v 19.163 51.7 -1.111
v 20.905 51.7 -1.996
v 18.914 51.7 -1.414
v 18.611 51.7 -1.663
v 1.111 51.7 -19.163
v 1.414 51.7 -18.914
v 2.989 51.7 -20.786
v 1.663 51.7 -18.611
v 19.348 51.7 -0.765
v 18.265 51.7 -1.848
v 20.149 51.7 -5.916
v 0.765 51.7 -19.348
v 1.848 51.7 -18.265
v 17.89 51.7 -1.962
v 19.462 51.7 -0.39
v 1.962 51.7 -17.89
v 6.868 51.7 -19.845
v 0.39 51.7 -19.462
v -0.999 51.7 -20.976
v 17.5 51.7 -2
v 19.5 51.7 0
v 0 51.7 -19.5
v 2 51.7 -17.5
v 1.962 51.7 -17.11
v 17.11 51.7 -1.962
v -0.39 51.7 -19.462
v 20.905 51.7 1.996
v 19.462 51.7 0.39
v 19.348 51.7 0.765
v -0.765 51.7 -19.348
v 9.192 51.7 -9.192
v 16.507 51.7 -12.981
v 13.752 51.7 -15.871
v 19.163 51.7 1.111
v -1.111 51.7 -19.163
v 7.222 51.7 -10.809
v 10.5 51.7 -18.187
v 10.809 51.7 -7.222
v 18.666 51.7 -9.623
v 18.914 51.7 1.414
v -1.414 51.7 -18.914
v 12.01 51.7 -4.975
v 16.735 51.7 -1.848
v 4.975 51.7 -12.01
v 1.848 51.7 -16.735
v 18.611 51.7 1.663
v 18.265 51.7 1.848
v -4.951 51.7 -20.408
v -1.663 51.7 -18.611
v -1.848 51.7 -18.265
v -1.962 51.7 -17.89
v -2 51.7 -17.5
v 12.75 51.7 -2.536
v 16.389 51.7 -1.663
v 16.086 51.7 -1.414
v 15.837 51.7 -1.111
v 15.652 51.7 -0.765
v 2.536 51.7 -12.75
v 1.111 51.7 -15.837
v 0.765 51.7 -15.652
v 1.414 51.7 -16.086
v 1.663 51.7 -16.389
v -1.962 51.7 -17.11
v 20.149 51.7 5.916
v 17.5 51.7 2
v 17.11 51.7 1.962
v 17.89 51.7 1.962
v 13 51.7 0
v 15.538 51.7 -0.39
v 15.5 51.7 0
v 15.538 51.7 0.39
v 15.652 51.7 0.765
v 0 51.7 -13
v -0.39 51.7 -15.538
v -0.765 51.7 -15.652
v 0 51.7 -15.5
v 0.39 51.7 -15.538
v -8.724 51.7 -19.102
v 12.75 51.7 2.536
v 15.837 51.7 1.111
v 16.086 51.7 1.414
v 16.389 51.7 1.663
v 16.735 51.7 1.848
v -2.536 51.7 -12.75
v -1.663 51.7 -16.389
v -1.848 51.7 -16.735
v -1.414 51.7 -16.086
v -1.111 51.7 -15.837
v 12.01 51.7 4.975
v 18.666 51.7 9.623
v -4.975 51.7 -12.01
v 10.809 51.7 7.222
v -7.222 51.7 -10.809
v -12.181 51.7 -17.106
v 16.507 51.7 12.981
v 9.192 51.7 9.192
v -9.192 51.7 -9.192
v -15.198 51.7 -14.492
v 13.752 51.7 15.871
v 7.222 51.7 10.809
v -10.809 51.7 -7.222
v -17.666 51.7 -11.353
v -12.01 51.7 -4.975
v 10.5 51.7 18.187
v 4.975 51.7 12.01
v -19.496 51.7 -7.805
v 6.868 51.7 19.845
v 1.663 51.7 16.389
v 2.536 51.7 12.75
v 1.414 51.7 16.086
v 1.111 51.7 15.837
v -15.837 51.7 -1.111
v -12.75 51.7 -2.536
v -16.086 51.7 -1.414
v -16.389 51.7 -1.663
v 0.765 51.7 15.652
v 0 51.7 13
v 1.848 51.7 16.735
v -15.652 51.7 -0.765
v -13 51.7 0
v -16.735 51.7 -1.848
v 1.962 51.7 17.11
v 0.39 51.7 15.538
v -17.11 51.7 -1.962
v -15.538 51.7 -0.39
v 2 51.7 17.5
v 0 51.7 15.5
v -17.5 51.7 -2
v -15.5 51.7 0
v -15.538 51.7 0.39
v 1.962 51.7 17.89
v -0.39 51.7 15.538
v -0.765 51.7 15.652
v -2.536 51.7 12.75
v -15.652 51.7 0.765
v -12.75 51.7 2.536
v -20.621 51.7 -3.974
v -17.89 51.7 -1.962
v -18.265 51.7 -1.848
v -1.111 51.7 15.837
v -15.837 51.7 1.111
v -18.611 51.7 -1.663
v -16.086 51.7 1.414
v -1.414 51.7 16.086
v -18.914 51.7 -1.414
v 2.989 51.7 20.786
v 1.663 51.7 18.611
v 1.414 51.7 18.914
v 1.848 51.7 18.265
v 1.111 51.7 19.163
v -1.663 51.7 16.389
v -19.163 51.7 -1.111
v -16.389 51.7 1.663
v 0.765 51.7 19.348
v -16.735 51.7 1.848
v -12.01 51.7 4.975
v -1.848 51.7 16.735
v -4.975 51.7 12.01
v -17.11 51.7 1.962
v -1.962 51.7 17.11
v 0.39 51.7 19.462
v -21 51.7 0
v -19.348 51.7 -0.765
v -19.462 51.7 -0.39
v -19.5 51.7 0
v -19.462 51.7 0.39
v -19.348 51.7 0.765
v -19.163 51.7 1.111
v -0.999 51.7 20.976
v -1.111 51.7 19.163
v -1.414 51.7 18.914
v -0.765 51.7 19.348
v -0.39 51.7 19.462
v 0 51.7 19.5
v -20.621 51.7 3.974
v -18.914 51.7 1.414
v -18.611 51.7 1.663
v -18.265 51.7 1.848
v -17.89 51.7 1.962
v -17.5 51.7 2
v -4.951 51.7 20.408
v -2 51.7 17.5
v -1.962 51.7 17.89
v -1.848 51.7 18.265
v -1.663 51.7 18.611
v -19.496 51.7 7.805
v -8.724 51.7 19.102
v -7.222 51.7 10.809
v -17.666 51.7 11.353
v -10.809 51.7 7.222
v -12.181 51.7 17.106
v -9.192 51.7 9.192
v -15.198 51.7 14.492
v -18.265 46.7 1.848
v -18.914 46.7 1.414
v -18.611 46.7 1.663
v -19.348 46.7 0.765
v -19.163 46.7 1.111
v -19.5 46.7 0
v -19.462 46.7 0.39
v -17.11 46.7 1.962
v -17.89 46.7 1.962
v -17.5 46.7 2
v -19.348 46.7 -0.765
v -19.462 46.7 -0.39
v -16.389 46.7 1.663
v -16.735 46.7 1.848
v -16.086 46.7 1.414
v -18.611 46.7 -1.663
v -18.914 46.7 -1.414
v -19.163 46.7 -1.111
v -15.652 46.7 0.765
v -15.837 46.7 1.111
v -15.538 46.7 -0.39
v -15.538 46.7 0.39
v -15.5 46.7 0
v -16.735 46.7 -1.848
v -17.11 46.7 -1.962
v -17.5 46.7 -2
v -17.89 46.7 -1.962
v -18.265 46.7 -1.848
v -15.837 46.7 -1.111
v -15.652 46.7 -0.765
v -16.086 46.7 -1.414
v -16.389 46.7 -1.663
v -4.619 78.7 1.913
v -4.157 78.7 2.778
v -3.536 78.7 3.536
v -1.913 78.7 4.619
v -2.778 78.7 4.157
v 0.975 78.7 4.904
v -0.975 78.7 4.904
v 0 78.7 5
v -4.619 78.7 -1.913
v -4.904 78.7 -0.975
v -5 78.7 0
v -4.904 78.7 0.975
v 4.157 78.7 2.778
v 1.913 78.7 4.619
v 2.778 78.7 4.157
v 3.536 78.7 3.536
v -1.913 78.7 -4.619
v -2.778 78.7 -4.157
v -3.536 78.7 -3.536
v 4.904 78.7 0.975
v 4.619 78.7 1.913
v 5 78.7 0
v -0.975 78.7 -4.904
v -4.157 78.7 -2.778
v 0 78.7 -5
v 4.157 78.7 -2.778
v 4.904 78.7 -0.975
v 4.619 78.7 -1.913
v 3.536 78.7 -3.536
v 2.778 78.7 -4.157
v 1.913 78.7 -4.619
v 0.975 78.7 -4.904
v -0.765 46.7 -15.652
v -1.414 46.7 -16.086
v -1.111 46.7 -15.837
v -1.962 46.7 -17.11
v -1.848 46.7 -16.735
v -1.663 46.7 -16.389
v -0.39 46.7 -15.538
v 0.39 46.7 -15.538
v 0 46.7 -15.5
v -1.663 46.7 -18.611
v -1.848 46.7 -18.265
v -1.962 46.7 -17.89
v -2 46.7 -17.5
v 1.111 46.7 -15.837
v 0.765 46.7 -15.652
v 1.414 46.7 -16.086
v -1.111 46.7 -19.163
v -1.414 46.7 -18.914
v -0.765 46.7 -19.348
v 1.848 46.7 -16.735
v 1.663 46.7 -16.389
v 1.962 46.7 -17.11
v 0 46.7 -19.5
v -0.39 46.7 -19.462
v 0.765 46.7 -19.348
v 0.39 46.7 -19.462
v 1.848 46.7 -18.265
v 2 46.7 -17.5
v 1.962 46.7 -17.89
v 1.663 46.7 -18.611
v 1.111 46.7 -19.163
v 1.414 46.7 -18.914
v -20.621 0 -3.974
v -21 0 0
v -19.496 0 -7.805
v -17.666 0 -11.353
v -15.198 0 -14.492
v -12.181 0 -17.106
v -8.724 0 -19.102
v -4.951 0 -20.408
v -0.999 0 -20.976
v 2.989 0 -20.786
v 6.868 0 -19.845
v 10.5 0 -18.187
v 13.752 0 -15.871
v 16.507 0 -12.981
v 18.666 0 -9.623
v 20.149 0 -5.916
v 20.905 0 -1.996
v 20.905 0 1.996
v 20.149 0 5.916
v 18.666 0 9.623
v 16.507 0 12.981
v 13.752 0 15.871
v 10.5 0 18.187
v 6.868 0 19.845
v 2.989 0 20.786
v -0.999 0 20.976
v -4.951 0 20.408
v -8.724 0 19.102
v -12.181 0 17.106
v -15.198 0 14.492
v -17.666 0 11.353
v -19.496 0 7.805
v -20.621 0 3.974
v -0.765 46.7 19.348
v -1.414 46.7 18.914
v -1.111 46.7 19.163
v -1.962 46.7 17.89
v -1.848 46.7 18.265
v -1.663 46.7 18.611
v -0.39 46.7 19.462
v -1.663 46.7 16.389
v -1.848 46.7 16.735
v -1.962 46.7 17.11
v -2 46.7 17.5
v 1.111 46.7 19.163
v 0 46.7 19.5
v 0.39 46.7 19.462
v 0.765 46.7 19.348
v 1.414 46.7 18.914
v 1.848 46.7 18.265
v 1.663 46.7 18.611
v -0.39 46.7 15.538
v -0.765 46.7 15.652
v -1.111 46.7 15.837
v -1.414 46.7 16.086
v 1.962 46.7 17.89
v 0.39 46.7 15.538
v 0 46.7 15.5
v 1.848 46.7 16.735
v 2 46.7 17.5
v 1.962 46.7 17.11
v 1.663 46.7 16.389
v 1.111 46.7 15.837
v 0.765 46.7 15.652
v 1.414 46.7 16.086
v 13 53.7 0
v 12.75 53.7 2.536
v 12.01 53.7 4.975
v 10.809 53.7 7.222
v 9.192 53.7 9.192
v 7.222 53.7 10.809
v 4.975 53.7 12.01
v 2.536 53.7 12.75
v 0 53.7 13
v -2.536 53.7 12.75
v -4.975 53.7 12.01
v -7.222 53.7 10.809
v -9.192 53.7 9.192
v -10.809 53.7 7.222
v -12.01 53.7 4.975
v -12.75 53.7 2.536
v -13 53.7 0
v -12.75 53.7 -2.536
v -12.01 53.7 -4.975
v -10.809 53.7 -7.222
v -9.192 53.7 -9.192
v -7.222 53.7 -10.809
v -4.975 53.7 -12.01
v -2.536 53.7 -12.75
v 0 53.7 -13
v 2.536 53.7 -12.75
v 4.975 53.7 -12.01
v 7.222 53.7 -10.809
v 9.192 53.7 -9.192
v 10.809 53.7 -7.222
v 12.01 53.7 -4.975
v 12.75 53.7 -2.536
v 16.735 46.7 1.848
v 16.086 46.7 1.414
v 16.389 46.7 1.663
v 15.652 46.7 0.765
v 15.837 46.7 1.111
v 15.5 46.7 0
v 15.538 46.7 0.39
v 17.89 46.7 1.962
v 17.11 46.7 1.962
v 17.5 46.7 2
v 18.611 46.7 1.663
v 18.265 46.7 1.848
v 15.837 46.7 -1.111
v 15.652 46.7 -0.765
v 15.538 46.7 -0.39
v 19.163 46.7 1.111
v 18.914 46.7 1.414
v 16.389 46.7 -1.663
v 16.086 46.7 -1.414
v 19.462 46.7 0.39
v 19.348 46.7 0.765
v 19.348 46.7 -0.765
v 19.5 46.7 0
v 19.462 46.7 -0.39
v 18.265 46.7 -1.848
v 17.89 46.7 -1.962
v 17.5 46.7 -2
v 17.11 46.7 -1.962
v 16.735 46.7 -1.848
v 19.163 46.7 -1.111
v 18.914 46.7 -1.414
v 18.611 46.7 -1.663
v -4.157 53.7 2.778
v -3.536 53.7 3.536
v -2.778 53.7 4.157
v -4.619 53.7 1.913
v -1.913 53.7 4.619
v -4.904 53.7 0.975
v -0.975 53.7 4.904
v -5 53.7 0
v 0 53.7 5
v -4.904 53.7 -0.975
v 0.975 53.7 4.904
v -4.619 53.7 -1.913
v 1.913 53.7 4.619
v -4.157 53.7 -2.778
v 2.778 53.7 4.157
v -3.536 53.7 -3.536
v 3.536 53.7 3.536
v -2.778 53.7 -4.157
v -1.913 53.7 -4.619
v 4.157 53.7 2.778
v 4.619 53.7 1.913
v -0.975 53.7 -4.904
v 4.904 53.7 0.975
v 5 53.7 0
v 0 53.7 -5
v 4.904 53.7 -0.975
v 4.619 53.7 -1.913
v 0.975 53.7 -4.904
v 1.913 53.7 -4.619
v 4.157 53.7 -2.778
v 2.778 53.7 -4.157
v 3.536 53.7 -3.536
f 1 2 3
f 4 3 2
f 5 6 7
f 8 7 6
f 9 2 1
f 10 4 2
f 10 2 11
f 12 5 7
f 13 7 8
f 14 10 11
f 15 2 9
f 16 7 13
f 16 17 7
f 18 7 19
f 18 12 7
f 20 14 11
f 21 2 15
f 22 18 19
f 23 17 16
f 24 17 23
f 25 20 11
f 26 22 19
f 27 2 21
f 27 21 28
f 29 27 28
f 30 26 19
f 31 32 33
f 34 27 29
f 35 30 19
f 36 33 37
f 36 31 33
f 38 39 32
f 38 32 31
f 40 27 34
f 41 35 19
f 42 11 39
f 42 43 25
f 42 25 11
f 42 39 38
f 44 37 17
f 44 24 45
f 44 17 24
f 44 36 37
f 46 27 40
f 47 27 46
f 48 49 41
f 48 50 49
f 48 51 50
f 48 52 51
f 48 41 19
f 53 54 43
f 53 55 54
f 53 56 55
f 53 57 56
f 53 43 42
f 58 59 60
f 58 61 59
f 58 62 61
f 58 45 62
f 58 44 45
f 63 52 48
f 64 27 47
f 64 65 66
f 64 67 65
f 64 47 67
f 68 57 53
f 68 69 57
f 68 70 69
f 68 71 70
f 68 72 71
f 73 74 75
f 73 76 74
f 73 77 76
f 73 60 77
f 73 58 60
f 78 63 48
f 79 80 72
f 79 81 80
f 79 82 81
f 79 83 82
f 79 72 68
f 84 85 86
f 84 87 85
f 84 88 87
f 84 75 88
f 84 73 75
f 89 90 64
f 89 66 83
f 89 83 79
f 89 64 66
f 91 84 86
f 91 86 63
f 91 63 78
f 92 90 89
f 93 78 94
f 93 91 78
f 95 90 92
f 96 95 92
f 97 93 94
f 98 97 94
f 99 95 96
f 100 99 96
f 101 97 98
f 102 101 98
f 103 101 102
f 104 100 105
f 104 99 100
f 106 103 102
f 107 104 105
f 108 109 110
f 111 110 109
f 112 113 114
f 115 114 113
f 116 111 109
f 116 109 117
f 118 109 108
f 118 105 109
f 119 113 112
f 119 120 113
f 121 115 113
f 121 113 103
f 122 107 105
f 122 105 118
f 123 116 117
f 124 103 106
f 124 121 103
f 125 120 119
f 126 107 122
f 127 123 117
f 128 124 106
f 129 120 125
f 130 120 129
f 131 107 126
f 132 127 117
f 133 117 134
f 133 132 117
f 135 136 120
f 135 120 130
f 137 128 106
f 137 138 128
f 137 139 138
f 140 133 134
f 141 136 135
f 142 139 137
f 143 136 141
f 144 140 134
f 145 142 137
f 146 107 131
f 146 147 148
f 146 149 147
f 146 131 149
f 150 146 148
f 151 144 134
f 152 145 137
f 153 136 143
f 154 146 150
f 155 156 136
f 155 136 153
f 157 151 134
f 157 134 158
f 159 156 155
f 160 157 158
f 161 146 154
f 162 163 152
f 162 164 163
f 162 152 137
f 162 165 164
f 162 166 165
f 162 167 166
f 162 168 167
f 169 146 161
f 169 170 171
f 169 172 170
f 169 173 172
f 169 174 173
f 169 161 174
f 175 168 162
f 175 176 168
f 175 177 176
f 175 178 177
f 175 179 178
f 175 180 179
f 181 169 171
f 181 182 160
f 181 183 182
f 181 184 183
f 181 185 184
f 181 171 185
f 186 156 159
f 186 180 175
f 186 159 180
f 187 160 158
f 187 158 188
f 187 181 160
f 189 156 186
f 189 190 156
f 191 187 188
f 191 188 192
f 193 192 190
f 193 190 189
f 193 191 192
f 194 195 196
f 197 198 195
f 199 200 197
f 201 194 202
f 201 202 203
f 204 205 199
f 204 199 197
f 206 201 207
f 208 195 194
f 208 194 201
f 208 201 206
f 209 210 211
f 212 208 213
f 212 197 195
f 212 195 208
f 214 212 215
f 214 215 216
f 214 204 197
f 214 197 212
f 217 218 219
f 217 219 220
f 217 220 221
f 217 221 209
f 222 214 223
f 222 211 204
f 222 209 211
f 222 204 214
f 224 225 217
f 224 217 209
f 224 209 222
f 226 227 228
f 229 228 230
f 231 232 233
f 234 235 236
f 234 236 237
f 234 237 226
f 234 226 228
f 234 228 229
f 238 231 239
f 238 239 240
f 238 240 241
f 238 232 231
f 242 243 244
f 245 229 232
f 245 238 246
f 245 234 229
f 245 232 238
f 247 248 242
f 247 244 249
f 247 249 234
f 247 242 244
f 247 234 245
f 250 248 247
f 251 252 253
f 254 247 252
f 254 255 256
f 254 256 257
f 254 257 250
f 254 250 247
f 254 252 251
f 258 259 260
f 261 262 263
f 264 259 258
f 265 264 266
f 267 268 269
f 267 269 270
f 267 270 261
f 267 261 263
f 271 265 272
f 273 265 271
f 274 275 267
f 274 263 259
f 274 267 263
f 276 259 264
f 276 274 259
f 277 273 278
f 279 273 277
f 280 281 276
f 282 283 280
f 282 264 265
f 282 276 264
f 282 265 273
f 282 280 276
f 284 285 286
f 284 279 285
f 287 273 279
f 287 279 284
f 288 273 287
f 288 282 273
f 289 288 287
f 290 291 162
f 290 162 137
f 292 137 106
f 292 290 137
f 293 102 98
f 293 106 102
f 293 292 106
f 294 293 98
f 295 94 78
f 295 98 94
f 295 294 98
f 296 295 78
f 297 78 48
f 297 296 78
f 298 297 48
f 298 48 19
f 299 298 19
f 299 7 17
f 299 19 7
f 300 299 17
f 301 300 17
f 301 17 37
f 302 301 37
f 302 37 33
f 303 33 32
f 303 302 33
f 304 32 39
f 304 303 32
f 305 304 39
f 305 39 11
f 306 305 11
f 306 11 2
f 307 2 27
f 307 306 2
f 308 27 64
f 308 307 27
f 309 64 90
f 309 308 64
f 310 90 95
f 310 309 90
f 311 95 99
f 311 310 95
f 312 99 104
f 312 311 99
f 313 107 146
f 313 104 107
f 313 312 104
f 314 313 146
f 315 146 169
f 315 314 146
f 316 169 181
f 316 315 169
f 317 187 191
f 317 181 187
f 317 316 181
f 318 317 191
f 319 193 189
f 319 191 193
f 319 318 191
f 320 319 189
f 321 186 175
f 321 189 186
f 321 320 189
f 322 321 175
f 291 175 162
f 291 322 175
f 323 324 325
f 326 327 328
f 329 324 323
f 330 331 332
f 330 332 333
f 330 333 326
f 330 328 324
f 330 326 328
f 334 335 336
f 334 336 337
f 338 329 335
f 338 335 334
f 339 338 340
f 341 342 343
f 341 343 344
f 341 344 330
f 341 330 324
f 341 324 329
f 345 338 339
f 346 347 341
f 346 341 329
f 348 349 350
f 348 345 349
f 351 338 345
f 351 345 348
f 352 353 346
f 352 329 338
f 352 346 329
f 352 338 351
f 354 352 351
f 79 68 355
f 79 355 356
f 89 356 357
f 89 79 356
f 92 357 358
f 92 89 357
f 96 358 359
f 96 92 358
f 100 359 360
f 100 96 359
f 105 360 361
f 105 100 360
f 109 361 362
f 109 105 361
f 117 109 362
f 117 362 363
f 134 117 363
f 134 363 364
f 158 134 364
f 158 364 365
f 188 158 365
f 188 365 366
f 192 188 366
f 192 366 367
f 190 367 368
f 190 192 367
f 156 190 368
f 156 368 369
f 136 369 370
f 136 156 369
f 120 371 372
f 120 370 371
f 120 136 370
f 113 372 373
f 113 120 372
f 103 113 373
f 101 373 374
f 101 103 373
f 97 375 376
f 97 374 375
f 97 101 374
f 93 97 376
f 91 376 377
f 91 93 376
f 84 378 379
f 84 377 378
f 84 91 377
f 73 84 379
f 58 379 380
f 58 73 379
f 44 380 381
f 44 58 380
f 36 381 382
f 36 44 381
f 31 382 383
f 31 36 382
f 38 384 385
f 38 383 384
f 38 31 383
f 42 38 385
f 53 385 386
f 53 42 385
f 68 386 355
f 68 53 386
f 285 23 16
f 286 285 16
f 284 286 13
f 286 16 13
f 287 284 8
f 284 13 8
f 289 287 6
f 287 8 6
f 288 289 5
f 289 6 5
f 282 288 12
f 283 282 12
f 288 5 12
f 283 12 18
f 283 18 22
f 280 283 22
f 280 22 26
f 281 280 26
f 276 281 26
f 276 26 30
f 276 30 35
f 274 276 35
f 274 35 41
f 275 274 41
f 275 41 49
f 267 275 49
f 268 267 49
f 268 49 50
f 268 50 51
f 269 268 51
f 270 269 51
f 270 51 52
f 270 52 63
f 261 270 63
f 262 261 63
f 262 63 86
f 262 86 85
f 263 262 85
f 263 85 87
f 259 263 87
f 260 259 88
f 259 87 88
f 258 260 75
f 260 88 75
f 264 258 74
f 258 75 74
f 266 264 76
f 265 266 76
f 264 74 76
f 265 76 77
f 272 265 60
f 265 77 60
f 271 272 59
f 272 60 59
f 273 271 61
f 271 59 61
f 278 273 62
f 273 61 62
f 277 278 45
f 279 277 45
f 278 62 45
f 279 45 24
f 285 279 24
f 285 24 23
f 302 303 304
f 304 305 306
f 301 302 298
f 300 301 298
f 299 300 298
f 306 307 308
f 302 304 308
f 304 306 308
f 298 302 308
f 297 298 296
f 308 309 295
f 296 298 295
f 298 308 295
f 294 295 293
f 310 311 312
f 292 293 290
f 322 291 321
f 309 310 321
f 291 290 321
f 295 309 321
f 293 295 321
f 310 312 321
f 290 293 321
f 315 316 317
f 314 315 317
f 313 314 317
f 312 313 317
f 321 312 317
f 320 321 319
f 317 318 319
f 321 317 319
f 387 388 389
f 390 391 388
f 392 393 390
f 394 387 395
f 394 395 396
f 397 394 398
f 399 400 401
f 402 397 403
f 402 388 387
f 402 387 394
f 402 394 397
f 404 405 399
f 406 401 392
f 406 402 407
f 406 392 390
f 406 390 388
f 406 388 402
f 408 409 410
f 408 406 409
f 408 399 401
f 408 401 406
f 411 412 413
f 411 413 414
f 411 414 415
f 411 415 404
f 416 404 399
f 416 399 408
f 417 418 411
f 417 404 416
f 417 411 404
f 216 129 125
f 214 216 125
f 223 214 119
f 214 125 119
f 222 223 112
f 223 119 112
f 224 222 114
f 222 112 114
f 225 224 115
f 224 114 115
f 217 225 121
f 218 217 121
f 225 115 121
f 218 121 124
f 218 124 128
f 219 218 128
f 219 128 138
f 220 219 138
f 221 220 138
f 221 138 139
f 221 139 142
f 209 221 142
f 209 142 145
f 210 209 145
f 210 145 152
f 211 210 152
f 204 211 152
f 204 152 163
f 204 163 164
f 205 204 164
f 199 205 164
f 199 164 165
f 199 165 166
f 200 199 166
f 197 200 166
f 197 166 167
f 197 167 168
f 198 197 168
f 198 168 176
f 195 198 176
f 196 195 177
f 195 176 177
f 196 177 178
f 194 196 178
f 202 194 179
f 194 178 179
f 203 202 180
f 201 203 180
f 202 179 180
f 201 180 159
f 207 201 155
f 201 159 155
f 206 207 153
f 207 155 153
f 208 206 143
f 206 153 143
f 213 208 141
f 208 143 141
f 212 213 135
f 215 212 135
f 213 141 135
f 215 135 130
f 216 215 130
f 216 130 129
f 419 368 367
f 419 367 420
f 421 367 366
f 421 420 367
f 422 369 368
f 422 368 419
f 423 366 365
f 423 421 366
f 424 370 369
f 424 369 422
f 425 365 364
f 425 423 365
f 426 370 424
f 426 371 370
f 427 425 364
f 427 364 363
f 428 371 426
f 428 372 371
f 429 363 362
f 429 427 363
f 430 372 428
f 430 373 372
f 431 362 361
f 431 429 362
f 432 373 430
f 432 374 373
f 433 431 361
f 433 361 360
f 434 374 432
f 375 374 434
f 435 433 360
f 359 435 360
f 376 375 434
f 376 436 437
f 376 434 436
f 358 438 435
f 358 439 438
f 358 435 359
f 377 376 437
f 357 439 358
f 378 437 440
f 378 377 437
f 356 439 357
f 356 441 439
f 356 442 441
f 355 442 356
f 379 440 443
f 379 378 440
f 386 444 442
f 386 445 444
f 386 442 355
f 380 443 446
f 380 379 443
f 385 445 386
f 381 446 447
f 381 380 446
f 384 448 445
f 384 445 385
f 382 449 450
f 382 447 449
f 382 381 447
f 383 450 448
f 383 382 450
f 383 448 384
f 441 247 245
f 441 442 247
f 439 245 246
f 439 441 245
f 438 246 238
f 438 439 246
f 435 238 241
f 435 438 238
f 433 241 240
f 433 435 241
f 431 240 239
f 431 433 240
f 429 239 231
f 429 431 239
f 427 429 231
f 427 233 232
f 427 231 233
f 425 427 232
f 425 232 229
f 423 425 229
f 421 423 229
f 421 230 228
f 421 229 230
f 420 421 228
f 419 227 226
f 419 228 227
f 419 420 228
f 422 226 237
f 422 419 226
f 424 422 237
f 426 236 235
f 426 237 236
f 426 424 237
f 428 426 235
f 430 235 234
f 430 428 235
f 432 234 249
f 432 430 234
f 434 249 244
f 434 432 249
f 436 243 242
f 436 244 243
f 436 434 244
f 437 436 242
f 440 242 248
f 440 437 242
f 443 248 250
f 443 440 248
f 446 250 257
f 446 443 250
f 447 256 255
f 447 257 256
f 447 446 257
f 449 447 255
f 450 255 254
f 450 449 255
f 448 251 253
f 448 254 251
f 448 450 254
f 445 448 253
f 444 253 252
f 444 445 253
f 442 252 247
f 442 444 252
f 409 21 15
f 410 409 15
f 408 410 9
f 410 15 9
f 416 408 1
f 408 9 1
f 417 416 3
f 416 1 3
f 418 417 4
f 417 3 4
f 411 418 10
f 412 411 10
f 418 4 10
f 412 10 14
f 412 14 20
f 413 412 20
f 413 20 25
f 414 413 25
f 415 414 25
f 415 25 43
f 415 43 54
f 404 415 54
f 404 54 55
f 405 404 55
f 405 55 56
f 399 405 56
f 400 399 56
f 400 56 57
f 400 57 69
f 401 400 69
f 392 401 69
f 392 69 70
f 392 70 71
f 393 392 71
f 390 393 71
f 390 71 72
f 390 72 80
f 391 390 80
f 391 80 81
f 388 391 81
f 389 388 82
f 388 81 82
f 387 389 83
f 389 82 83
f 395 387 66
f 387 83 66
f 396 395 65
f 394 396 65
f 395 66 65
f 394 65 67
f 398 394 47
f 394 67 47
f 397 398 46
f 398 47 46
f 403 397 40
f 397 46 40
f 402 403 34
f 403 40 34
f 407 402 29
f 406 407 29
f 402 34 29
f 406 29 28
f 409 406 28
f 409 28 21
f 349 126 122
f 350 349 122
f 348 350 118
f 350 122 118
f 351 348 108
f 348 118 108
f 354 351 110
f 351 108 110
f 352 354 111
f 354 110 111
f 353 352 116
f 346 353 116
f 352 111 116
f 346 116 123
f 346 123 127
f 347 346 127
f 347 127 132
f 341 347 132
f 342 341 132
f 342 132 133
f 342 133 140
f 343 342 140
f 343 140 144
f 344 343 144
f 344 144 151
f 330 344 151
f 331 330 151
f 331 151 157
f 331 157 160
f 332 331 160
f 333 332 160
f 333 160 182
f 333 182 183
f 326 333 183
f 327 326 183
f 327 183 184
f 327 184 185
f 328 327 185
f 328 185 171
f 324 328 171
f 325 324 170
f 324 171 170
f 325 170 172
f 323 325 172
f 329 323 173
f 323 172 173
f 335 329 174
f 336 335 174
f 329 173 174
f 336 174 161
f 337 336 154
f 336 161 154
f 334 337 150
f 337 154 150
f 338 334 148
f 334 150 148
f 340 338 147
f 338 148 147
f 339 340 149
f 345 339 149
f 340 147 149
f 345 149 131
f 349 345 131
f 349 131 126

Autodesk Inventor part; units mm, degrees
ref_plane "YZ Plane" through (0, 0, 0) normal (1, 0, 0) x (0, 1, 0)
ref_plane "XZ Plane" through (0, 0, 0) normal (0, 1, 0) x (-1, 0, 0)
ref_plane "XY Plane" through (0, 0, 0) normal (0, 0, 1) x (1, 0, 0)
sketch "Sketch1" plane through (0, 0, 0) normal (0, 1, 0) x (-1, 0, 0)
  circle A0 centre (0, 0) radius 21
  dimension "d0" = 42
extrude "Extrusion1" add sketch "Sketch1" along normal blind 51.7
sketch "Sketch2" plane through (0, 51.7, 0) normal (0, 1, 0) x (1, 0, 0)
  circle A0 centre (0, 0) radius 13
  dimension "d3" = 26
extrude "Extrusion2" add sketch "Sketch2" along normal blind 2
sketch "Sketch3" plane through (0, 53.7, 0) normal (0, 1, 0) x (1, 0, 0)
  circle A0 centre (0, 0) radius 5
  dimension "d6" = 10
extrude "Extrusion3" add sketch "Sketch3" along normal blind 25
sketch "Sketch4" plane through (0, 51.7, 0) normal (0, 1, 0) x (1, 0, 0)
  circle A0 centre (0, -17.5) radius 2
  line L0 (0, -17.5) -> (0, 0) construction
  circle A1 centre (17.5, 0) radius 2
  circle A2 centre (0, 17.5) radius 2
  circle A3 centre (-17.5, 0) radius 2
  dimension "d9" = 4
  dimension "d10" = 17.5
  dimension "d13" = 360
extrude "Extrusion4" cut sketch "Sketch4" against normal blind 5
properties part number "27-1 Gearbox" material "Aluminum 6061"
